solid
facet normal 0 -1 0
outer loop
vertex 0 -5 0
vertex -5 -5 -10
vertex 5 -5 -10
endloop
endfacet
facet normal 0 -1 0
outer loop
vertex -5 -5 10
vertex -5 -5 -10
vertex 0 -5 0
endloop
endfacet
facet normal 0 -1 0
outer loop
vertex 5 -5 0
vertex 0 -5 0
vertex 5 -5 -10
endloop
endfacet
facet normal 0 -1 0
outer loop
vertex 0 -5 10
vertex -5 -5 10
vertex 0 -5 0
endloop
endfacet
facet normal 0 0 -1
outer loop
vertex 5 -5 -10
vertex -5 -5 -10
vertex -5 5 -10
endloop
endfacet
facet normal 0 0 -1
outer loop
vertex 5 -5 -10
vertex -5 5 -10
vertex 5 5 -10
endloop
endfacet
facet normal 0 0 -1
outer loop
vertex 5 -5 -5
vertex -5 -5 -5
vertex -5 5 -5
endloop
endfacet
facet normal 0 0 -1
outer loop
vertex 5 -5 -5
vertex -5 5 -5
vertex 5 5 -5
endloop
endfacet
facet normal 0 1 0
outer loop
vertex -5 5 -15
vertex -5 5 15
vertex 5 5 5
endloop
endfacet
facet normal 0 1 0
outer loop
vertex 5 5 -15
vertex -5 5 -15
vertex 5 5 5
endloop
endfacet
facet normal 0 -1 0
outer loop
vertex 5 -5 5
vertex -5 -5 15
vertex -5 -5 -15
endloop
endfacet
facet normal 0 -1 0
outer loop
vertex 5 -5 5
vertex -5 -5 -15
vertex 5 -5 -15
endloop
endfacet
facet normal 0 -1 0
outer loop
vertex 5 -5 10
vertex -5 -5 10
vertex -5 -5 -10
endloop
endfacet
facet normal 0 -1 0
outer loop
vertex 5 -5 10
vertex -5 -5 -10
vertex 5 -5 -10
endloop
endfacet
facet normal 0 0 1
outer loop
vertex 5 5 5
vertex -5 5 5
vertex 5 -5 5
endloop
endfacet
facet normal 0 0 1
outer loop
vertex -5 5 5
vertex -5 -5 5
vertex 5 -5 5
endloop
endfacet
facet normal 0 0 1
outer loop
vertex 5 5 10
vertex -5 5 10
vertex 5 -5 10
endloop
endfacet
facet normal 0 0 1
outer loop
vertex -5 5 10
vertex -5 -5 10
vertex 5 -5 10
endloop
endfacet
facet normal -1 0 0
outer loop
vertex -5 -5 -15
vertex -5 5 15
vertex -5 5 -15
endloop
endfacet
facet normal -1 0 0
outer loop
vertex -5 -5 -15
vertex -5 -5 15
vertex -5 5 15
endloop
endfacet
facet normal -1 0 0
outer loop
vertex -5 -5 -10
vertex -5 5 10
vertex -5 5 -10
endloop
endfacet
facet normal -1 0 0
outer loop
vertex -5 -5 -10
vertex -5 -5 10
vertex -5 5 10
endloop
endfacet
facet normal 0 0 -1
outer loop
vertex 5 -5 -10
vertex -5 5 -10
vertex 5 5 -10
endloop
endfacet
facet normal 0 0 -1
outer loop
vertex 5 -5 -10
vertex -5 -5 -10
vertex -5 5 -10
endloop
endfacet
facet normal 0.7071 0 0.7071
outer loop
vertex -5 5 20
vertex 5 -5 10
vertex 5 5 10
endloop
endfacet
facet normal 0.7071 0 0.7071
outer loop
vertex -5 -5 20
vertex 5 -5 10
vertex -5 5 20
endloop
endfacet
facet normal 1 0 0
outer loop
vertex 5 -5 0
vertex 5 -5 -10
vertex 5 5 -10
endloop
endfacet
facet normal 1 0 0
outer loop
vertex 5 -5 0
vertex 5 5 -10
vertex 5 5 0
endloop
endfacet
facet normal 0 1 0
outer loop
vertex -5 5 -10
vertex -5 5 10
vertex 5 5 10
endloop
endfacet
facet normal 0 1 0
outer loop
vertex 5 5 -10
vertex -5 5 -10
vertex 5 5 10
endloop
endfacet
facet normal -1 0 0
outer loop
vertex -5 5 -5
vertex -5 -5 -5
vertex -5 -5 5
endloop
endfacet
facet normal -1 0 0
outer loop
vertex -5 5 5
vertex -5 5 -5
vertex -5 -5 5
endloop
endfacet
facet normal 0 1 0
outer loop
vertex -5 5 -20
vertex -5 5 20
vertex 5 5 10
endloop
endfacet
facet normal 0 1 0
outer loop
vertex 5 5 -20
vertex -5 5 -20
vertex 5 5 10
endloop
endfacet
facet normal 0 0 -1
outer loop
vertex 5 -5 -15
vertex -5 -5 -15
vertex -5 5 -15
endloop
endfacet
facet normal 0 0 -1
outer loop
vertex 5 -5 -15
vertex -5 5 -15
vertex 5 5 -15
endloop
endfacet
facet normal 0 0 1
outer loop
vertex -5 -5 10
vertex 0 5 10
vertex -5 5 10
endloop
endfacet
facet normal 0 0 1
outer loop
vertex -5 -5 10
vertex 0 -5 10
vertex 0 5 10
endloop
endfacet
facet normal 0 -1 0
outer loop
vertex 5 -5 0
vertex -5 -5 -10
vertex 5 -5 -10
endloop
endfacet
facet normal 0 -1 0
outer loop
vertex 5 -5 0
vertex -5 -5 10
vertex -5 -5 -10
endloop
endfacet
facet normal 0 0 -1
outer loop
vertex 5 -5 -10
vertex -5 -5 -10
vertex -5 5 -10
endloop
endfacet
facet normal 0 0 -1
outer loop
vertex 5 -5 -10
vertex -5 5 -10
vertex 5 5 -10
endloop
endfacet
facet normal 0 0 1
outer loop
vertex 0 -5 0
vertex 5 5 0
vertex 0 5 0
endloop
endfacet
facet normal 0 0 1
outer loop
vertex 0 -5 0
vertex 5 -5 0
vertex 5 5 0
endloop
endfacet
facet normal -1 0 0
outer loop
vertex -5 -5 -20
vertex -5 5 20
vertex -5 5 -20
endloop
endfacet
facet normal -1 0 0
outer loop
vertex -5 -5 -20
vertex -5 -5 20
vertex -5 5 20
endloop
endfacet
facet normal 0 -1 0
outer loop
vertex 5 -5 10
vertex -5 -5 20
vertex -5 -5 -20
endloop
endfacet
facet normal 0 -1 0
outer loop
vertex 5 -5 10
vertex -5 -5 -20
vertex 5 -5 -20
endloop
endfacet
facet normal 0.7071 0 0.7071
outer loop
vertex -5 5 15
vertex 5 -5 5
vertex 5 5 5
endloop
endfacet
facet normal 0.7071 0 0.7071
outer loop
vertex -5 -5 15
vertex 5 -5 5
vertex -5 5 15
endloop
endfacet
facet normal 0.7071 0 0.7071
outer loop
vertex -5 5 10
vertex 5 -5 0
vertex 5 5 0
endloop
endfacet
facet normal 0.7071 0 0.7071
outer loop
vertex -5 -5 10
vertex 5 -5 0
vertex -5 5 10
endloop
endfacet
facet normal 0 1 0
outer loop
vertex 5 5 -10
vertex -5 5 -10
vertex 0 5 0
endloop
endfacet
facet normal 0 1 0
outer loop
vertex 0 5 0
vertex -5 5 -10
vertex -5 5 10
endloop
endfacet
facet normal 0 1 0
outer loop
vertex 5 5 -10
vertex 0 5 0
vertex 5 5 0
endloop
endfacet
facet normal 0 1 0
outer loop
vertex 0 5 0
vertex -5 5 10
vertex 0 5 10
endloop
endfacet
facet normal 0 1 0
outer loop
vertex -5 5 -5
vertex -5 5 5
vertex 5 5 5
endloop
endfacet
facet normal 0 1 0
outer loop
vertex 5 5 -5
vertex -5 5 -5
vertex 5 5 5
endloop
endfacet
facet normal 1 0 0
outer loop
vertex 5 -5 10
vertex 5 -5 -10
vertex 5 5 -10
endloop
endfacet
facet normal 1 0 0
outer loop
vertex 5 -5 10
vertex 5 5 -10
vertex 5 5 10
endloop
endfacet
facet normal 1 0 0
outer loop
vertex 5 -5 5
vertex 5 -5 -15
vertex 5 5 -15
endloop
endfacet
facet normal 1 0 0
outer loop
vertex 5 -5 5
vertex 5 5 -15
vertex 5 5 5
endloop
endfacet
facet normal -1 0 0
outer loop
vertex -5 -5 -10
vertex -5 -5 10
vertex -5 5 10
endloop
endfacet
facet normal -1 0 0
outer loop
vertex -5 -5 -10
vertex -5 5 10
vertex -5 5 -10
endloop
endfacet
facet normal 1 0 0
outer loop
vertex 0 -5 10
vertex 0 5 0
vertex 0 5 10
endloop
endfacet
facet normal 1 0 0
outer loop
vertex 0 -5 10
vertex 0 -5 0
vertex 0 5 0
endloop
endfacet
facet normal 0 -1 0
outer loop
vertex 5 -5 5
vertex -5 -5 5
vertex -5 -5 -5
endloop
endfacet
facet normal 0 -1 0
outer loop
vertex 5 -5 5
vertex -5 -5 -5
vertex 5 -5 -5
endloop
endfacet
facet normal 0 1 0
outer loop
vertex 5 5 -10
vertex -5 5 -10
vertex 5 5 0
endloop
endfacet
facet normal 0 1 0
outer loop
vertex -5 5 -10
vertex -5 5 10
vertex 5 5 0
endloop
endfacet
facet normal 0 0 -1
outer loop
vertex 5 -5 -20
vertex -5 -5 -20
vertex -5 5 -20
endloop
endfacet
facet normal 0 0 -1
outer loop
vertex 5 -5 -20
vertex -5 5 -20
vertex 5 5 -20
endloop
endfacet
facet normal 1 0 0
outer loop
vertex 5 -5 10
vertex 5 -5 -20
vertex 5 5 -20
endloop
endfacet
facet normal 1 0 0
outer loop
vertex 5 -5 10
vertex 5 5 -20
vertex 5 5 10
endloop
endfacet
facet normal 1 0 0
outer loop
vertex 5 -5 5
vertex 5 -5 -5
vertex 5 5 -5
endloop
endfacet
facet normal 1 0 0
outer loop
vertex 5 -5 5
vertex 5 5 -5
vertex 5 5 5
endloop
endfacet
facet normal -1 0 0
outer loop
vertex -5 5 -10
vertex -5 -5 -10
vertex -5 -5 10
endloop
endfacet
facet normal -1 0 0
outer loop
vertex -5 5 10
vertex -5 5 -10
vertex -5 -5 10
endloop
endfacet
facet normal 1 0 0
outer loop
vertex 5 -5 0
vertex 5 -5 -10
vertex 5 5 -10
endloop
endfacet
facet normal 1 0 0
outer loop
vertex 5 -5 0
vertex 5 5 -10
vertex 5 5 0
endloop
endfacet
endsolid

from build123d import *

# Parameters (mm, degrees)
F0_W      = 10
F0_H      = 10
F1_DEPTH  = 5
F2_W      = 10
F2_H      = 20
F3_DEPTH  = 5
F5_DEPTH  = 5
F7_DEPTH  = 5
F9_DEPTH  = 5
F11_DEPTH = 5


with BuildPart() as f1:
    # F0 (on Front) → F1 (new body, symmetric)
    with BuildSketch(Plane.XZ):
        Rectangle(F0_W, F0_H)
    extrude(amount=F1_DEPTH, both=True)


with BuildPart() as f3:
    # F2 (on Front) → F3 (new body, symmetric)
    with BuildSketch(Plane.XZ):
        Rectangle(F2_W, F2_H)
    extrude(amount=F3_DEPTH, both=True)


with BuildPart() as f5:
    # F4 (on Front) → F5 (new body, symmetric)
    with BuildSketch(Plane.XZ):
        Polygon((0, 10), (-5, 10), (-5, -10), (5, -10), (5, 0), (0, 0), align=None)
    extrude(amount=F5_DEPTH, both=True)


with BuildPart() as f7:
    # F6 (on Front) → F7 (new body, symmetric)
    with BuildSketch(Plane.XZ):
        Polygon((-5, -10), (5, -10), (5, 0), (-5, 10), align=None)
    extrude(amount=F7_DEPTH, both=True)


with BuildPart() as f9:
    # F8 (on Front) → F9 (new body, symmetric)
    with BuildSketch(Plane.XZ):
        Polygon((-5, 15), (-5, -15), (5, -15), (5, 5), align=None)
    extrude(amount=F9_DEPTH, both=True)


with BuildPart() as f11:
    # F10 (on Front) → F11 (new body, symmetric)
    with BuildSketch(Plane.XZ):
        Polygon((-5, 20), (-5, -20), (5, -20), (5, 10), align=None)
    extrude(amount=F11_DEPTH, both=True)


solid = Compound([f1.part, f3.part, f5.part, f7.part, f9.part, f11.part])
